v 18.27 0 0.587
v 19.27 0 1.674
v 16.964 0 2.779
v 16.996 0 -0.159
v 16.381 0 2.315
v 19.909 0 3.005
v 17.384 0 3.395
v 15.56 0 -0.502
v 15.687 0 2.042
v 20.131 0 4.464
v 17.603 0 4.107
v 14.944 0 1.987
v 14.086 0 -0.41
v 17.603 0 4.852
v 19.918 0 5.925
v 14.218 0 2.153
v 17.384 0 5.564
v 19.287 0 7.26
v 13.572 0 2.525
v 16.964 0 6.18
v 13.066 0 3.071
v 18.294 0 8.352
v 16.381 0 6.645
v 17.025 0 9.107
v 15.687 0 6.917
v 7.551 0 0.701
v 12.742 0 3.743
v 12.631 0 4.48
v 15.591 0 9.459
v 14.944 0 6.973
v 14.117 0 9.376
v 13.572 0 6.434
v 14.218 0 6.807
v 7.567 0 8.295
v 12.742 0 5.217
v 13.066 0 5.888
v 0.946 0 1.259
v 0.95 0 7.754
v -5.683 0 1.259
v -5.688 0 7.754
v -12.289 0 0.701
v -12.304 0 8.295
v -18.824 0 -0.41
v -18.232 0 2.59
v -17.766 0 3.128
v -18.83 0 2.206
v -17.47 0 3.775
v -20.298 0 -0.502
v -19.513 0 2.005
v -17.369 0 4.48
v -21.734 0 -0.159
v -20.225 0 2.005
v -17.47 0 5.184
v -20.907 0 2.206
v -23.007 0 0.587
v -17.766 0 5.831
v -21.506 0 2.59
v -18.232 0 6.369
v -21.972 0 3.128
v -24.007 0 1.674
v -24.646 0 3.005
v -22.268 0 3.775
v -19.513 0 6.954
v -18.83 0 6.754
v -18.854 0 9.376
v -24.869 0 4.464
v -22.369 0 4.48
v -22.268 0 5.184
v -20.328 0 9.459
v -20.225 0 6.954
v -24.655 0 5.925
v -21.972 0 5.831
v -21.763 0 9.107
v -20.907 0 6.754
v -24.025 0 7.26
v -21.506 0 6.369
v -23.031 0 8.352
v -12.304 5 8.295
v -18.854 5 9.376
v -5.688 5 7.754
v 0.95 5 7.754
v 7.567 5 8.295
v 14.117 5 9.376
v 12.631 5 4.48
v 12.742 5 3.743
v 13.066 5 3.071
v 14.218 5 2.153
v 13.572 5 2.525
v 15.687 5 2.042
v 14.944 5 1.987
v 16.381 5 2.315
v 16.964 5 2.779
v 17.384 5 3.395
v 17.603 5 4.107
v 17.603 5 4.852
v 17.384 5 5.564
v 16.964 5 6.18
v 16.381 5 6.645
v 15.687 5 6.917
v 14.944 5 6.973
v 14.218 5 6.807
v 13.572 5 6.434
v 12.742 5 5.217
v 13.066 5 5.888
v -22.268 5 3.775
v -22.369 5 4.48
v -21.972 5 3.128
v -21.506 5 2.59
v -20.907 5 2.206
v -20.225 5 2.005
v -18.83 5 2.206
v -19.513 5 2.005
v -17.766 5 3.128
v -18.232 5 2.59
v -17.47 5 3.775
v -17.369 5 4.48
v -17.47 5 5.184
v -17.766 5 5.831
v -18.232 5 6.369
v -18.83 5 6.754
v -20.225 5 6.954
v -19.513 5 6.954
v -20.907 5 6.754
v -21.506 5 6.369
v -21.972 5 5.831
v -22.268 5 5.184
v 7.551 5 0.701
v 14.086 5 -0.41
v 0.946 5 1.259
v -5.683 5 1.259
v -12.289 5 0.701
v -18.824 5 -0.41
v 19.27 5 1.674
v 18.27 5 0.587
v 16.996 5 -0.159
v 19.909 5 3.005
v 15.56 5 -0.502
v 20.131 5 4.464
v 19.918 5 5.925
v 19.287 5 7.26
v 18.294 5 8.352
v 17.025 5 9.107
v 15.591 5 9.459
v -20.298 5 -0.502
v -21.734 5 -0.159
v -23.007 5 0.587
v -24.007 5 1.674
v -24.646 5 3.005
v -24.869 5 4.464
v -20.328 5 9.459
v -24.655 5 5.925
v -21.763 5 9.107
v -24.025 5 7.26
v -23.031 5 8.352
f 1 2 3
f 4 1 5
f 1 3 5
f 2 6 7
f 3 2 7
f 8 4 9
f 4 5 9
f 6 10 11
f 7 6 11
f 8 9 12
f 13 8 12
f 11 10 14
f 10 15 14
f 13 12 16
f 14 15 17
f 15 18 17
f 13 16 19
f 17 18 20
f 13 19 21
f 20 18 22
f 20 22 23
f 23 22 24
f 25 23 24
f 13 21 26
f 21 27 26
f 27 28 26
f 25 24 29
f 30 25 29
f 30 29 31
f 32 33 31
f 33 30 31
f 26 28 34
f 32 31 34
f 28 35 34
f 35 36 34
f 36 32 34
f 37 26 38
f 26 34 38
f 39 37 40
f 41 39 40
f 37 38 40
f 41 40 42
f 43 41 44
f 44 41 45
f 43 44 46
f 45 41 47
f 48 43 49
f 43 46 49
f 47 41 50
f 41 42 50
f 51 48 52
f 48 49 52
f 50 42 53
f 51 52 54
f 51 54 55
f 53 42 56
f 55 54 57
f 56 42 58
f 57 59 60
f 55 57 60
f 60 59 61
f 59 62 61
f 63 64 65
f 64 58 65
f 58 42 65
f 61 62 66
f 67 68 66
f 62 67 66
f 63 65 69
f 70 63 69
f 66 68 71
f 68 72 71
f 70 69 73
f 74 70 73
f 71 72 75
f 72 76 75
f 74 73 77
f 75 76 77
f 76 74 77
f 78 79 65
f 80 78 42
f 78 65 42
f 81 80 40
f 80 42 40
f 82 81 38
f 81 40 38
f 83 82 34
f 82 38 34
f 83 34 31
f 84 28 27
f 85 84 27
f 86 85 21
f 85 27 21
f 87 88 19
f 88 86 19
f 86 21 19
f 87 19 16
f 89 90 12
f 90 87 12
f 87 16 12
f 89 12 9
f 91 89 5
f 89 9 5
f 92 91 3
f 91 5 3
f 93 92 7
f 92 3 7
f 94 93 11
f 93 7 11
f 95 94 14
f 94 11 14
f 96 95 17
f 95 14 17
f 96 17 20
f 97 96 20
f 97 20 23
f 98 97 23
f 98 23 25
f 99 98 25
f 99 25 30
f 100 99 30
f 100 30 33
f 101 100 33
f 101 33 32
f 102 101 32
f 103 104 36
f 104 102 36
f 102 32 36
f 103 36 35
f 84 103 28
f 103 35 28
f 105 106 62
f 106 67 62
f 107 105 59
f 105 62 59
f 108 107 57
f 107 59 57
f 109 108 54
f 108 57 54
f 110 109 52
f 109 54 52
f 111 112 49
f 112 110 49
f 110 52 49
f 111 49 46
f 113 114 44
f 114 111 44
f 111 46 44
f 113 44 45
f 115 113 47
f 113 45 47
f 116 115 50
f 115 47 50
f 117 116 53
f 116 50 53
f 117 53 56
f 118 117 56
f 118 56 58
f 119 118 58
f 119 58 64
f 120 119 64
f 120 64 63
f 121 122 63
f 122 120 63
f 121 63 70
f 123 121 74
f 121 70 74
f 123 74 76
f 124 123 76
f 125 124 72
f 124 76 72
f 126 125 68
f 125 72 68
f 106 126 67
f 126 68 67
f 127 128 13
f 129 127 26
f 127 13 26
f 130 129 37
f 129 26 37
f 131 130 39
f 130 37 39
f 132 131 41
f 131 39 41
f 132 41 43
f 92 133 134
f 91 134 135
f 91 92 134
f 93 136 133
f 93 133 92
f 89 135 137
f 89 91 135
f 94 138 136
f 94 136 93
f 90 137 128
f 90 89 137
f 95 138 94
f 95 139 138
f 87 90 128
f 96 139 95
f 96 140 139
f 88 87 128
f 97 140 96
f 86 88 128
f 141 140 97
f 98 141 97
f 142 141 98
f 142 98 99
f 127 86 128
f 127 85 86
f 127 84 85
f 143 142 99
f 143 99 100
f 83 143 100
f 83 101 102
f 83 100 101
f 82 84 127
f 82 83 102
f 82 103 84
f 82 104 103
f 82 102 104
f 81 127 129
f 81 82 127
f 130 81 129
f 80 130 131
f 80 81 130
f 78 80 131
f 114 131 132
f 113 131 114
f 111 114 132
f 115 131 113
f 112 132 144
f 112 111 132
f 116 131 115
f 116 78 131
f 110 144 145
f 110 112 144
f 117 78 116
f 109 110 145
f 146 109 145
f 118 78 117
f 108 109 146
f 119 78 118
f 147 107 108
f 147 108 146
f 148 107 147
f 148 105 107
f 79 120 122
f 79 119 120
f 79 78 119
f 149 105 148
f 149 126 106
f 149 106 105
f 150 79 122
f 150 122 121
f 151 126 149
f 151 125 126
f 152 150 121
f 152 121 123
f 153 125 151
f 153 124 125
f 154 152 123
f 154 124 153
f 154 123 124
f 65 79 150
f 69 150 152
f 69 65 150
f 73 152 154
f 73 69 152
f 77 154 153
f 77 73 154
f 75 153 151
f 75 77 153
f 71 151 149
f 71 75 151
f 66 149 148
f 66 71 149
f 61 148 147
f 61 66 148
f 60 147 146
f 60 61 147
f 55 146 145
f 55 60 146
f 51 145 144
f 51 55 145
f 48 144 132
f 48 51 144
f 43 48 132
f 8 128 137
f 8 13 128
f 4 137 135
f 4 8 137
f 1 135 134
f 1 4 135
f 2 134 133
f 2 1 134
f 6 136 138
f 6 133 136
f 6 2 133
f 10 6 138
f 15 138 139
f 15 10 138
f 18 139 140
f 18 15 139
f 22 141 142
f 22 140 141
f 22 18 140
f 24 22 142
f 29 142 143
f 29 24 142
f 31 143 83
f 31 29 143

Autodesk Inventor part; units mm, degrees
ref_plane "YZ Plane" through (0, 0, 0) normal (1, 0, 0) x (0, 1, 0)
ref_plane "XZ Plane" through (0, 0, 0) normal (0, 1, 0) x (-1, 0, 0)
ref_plane "XY Plane" through (0, 0, 0) normal (0, 0, 1) x (1, 0, 0)
sketch "Sketch1" plane through (0, 0, 0) normal (0, 1, 0) x (-1, 0, 0)
  line L0 (-15.1311, 4.4797) -> (19.8689, 4.4797)
  circle A0 centre (19.8689, 4.4797) radius 2.5
  circle A1 centre (-15.1311, 4.4797) radius 2.5
  circle A2 centre (-15.1311, 4.4797) radius 5
  circle A3 centre (19.8689, 4.4797) radius 5
  line L1 (2.3689, 4.4797) -> (2.3689, 1.3284)
  line L2 (2.3689, 1.3284) -> (2.3689, 4.4797)
  line L3 (2.3689, 4.4797) -> (2.3689, 7.6857)
  arc A4 (-14.1166, 9.3757) -> (18.8544, 9.3757) centre (2.3689, 88.9357) ccw
  arc A5 (18.8242, -0.4099) -> (-14.0864, -0.4099) centre (2.3689, -77.427) ccw
  point P0 (0, 0)
  point P1 (7.7903, 4.509)
  dimension "d0" = 35
  dimension "d1" = 5
  dimension "d2" = 5
  dimension "d3" = 10
  dimension "d4" = 10
extrude "Extrusion1" add sketch "Sketch1" along normal blind 5
properties part number "body-tail"
